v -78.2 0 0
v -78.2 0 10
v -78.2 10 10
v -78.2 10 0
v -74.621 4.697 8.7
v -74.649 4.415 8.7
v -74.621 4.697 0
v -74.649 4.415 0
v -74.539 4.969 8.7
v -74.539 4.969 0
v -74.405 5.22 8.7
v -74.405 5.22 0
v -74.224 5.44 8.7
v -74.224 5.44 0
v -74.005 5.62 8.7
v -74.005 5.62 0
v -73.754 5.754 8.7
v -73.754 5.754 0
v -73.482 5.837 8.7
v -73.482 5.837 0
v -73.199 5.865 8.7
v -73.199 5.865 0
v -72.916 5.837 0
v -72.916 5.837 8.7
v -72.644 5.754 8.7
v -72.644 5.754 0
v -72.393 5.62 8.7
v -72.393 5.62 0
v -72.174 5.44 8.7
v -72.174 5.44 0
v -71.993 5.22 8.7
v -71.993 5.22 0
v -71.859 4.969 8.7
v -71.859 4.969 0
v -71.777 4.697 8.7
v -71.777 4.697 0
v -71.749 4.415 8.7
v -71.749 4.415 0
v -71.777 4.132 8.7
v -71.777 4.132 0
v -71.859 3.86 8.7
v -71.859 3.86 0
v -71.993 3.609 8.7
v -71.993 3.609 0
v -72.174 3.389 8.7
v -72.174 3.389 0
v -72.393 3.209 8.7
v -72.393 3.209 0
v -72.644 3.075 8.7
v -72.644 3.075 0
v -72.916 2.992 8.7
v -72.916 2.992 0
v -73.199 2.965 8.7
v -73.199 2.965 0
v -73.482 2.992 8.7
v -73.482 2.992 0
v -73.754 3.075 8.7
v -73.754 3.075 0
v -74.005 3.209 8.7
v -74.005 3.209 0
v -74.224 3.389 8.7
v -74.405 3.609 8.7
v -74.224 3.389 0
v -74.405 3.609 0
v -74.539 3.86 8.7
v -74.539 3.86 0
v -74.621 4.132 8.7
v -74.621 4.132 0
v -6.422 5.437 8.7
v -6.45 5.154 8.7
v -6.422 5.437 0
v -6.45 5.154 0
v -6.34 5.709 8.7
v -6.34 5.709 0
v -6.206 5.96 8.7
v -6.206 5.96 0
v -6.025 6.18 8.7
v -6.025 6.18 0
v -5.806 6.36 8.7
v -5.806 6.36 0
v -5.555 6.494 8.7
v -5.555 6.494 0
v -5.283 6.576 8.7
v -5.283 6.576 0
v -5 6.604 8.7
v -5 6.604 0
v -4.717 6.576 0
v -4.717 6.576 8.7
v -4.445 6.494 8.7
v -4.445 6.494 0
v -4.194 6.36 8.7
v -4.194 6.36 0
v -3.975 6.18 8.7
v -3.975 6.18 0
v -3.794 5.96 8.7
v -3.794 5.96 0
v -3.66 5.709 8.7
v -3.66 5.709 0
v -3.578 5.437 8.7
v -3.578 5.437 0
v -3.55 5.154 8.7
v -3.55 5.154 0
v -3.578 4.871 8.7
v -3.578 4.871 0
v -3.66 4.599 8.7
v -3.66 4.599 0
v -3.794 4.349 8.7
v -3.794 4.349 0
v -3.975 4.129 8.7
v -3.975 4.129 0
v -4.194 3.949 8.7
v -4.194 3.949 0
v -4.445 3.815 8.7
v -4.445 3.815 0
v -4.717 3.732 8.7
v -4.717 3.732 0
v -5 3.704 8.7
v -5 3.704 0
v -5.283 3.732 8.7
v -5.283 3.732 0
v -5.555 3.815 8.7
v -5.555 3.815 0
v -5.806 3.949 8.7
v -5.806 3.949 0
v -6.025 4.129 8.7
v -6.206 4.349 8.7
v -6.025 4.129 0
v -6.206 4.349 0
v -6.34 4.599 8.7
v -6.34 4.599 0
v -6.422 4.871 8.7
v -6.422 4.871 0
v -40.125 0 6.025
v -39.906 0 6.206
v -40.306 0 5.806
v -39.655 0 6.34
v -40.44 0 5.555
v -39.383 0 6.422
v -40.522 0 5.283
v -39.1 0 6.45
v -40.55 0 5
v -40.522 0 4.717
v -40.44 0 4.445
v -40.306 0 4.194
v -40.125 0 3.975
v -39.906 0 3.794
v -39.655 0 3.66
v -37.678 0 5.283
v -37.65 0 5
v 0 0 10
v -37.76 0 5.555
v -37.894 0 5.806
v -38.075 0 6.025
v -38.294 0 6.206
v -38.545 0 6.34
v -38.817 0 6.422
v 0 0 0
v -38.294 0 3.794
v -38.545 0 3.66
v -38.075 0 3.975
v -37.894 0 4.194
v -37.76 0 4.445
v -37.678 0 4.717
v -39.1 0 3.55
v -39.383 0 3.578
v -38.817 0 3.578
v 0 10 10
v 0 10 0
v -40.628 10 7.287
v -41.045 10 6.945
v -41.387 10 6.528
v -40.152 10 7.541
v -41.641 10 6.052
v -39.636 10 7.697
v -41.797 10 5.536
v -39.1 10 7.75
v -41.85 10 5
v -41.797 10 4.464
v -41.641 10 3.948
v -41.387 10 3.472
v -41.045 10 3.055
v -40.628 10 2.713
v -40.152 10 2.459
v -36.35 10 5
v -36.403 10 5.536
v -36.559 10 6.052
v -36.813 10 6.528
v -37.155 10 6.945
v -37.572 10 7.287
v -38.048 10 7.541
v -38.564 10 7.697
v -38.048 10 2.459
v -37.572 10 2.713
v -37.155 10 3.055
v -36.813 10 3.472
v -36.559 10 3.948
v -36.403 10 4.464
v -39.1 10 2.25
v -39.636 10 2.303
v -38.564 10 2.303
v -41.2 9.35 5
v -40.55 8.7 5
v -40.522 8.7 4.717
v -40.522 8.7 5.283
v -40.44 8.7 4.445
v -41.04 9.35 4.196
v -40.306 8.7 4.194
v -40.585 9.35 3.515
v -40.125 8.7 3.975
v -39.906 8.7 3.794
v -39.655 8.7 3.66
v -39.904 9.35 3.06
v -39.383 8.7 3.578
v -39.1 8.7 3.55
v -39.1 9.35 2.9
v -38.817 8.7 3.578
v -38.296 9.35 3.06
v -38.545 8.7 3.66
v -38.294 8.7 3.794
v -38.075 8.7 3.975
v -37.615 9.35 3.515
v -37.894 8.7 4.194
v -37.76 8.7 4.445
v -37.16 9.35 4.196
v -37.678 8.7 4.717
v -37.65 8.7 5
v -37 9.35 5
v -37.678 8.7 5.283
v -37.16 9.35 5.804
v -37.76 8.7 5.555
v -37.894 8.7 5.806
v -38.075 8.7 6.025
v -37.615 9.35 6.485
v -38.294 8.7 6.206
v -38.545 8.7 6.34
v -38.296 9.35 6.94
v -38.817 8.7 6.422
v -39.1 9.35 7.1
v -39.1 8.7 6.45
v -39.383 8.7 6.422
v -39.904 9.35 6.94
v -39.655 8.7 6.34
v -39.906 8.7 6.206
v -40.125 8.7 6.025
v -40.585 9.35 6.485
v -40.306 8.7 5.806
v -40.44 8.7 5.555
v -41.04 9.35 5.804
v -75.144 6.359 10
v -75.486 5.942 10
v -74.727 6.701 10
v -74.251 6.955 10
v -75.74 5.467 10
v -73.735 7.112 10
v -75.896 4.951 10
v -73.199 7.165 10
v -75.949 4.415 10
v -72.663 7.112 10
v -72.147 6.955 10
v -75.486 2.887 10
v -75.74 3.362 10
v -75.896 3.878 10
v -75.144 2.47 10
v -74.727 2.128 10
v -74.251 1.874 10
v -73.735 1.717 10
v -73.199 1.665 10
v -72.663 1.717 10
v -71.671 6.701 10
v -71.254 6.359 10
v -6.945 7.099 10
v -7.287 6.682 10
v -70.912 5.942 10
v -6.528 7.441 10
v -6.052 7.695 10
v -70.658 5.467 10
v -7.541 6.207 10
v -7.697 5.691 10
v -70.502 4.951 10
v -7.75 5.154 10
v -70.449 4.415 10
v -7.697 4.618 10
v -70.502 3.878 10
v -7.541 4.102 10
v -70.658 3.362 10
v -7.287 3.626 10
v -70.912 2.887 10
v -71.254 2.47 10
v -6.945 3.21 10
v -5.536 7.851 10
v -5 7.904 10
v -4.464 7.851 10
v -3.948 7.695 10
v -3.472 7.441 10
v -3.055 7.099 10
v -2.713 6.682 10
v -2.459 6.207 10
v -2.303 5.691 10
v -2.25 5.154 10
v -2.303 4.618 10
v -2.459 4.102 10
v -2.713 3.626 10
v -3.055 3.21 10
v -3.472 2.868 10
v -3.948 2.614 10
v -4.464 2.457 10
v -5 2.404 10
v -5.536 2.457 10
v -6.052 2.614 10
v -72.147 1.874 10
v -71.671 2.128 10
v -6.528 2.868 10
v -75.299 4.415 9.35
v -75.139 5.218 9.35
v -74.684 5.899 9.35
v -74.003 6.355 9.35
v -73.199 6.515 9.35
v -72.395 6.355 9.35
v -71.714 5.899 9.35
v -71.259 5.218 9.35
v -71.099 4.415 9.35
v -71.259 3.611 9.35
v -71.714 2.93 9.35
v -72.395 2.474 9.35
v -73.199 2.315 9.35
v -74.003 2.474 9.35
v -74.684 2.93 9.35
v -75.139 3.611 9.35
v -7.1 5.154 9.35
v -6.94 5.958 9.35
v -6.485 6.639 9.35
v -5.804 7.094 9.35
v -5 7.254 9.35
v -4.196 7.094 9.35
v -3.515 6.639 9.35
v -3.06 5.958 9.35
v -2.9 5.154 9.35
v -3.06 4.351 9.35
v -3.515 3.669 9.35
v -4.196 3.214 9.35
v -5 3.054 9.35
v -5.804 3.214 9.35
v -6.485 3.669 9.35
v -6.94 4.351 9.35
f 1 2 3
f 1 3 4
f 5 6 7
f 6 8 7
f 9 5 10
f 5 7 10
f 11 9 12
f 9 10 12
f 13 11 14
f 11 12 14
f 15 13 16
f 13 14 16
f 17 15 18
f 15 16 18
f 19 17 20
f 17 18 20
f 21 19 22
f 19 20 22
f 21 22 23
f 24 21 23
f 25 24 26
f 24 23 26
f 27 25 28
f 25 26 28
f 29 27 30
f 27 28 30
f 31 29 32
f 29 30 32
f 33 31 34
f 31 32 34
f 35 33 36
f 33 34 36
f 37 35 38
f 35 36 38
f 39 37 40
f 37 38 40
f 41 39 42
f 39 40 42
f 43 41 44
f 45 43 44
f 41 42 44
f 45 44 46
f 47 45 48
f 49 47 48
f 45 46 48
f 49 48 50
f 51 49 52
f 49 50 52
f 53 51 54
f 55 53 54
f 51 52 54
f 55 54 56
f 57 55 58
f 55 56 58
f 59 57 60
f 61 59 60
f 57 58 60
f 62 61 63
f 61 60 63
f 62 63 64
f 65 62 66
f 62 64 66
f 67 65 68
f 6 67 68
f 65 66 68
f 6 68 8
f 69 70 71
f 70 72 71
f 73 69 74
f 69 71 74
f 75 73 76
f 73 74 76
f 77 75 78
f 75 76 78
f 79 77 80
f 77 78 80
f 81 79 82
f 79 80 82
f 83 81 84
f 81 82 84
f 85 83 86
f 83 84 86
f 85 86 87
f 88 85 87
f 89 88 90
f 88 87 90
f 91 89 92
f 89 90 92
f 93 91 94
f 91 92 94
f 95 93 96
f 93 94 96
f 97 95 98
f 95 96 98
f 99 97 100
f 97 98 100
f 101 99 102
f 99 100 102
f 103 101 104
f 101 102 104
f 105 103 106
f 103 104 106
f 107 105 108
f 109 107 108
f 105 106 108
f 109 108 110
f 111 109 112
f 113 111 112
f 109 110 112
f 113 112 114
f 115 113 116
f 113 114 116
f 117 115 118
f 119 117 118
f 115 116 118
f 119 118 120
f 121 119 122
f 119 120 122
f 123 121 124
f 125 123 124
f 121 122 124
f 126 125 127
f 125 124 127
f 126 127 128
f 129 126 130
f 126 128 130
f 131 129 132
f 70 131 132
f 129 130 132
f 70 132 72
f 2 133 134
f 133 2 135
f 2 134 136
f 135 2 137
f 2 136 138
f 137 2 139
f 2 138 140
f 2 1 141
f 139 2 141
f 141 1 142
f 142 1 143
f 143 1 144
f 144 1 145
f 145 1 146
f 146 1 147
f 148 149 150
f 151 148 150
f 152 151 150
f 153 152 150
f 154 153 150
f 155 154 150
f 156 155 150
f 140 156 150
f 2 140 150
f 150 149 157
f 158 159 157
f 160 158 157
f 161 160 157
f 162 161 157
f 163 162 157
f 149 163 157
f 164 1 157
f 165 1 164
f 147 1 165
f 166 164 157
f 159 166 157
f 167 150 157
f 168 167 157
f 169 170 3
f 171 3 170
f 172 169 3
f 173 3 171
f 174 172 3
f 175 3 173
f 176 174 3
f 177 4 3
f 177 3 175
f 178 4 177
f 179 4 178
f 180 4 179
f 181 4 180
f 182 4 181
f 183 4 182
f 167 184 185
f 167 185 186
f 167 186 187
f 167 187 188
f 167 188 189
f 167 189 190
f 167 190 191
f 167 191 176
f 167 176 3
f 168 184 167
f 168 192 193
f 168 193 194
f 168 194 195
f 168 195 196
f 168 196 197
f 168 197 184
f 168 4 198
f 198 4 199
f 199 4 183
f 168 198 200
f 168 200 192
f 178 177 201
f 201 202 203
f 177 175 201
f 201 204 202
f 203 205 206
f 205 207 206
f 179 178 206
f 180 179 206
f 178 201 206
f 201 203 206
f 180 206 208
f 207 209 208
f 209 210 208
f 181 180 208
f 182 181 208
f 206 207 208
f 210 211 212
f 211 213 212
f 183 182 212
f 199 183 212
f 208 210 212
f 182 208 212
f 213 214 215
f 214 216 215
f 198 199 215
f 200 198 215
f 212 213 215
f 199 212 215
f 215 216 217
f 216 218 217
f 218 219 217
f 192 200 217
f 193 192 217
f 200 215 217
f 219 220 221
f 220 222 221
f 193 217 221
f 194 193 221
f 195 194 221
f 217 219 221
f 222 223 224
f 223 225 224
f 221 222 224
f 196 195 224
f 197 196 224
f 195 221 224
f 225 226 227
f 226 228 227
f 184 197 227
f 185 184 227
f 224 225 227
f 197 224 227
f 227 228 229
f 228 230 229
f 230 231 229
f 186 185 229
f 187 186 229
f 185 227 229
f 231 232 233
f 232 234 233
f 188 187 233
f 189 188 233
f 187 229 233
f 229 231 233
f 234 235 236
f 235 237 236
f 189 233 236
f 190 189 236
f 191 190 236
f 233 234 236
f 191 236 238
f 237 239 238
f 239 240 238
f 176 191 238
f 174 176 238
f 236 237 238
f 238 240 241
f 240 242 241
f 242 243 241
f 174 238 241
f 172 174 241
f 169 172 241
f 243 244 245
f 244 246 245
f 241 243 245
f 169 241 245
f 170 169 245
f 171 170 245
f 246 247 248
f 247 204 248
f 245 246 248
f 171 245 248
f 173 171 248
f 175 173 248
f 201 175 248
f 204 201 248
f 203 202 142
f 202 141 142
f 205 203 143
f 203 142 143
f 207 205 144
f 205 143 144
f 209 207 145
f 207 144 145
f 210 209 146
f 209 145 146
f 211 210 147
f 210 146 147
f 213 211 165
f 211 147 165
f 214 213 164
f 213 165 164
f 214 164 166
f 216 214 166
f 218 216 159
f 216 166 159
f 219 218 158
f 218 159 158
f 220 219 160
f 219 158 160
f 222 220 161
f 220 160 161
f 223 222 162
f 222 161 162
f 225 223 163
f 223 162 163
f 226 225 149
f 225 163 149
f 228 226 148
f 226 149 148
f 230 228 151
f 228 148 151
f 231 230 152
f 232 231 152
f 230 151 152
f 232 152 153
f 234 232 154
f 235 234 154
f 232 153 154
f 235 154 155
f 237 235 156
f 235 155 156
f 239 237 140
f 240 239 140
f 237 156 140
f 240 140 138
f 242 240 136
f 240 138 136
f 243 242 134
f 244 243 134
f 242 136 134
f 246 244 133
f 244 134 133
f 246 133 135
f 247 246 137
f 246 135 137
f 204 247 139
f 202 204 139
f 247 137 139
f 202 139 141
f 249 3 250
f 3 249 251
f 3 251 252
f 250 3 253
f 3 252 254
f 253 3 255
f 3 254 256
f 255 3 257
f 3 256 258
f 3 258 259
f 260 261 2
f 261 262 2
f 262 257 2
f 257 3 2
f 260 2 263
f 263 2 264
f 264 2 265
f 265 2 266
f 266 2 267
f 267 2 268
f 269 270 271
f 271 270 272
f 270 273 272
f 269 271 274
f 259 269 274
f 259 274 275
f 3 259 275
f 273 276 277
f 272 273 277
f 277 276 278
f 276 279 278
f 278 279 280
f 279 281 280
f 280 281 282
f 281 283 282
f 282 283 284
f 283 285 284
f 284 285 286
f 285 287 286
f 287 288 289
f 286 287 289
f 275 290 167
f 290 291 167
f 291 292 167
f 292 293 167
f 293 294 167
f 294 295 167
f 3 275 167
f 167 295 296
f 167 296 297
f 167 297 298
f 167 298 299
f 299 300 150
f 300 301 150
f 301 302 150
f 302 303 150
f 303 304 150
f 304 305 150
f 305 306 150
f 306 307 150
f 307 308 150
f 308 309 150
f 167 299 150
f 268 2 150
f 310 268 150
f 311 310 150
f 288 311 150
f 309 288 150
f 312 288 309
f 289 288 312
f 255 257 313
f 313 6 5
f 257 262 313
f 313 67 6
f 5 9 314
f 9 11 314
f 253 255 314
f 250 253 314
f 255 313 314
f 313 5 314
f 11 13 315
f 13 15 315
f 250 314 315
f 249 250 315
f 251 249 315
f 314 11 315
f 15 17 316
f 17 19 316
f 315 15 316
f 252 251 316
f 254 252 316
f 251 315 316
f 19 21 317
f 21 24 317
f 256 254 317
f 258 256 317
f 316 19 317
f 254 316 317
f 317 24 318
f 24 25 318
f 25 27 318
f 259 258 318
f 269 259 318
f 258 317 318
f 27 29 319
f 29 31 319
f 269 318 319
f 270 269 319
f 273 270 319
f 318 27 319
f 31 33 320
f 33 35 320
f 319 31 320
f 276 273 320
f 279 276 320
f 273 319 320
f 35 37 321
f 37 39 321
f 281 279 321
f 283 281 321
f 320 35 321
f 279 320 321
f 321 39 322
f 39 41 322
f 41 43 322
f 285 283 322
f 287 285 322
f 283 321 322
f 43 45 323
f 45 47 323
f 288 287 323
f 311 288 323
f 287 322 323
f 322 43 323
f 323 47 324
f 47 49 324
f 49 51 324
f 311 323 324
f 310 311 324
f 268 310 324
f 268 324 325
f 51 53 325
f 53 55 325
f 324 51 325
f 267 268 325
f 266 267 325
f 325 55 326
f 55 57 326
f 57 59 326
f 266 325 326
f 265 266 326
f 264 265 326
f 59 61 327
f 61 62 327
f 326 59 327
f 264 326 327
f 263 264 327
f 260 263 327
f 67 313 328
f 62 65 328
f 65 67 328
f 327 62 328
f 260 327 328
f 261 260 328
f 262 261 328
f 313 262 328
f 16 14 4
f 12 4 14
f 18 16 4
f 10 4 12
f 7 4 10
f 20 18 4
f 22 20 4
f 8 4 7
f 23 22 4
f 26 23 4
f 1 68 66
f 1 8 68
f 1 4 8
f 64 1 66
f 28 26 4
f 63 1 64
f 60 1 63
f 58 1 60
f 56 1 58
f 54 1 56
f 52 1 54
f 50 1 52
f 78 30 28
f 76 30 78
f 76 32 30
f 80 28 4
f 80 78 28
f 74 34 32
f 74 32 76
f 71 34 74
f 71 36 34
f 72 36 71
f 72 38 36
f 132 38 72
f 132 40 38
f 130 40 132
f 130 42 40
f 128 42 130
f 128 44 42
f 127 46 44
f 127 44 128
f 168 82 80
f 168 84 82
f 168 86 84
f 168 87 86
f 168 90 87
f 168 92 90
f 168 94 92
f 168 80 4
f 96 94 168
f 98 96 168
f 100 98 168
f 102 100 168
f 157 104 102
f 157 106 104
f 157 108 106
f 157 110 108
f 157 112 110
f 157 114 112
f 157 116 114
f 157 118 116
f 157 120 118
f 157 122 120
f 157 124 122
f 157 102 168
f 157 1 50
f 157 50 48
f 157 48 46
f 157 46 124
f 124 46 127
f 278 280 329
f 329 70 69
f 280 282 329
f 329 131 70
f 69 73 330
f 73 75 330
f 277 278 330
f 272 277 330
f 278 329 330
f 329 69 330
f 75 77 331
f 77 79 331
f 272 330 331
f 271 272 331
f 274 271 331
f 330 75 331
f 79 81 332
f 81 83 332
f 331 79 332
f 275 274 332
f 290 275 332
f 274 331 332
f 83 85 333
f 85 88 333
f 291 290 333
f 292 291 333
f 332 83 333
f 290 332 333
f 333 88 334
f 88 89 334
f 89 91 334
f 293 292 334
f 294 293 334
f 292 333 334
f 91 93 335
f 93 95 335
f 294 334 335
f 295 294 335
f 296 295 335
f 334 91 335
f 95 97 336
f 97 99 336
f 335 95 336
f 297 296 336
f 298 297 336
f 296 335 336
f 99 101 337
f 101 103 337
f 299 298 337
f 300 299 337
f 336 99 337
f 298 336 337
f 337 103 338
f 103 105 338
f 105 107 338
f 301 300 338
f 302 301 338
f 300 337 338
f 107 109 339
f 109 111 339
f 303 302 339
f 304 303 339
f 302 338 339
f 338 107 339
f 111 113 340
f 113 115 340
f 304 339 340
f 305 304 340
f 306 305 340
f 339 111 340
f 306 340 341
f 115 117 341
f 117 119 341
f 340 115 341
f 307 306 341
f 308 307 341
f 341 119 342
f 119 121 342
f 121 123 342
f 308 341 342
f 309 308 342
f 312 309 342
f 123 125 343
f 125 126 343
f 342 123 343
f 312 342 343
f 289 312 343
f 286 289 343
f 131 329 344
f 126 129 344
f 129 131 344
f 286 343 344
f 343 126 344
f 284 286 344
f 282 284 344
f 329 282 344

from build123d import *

# Parameters (mm, degrees)
SKETCH1_W                                         = 78.2
SKETCH1_H                                         = 10
BOSS_EXTRUDE1_DEPTH                               = 10
CSK_FOR_M2_5_FLAT_HEAD_MACHINE_SCREW1_D           = 2.9
CSK_FOR_M2_5_FLAT_HEAD_MACHINE_SCREW1_CSINK_D     = 5.5
CSK_FOR_M2_5_FLAT_HEAD_MACHINE_SCREW1_CSINK_ANGLE = 90
CSK_FOR_M2_5_FLAT_HEAD_MACHINE_SCREW2_D           = 2.9
CSK_FOR_M2_5_FLAT_HEAD_MACHINE_SCREW2_CSINK_D     = 5.5
CSK_FOR_M2_5_FLAT_HEAD_MACHINE_SCREW2_CSINK_ANGLE = 90
CSK_FOR_M2_5_FLAT_HEAD_MACHINE_SCREW3_D           = 2.9
CSK_FOR_M2_5_FLAT_HEAD_MACHINE_SCREW3_CSINK_D     = 5.5
CSK_FOR_M2_5_FLAT_HEAD_MACHINE_SCREW3_CSINK_ANGLE = 90


with BuildPart() as part:
    # Sketch1 → Boss-Extrude1 (new body)
    with BuildSketch(Plane(origin=(0, 0, 0), x_dir=(1, 0, 0), z_dir=(0, 1, 0))):
        with Locations((-39.1, -5)):
            Rectangle(SKETCH1_W, SKETCH1_H)
    extrude(amount=BOSS_EXTRUDE1_DEPTH)

    # CSK for M2.5 Flat Head Machine Screw1 (through all)
    with Locations(Plane.XY.offset(10)):
        with Locations((-5, 5.154214905)):
            CounterSinkHole(CSK_FOR_M2_5_FLAT_HEAD_MACHINE_SCREW1_D / 2, CSK_FOR_M2_5_FLAT_HEAD_MACHINE_SCREW1_CSINK_D / 2, counter_sink_angle=CSK_FOR_M2_5_FLAT_HEAD_MACHINE_SCREW1_CSINK_ANGLE)

    # CSK for M2.5 Flat Head Machine Screw2 (through all)
    with Locations(Plane.XY.offset(10)):
        with Locations((-73.199, 4.414547578)):
            CounterSinkHole(CSK_FOR_M2_5_FLAT_HEAD_MACHINE_SCREW2_D / 2, CSK_FOR_M2_5_FLAT_HEAD_MACHINE_SCREW2_CSINK_D / 2, counter_sink_angle=CSK_FOR_M2_5_FLAT_HEAD_MACHINE_SCREW2_CSINK_ANGLE)

    # CSK for M2.5 Flat Head Machine Screw3 (through all)
    with Locations(Plane(origin=(0, 10, 0), x_dir=(1, 0, 0), z_dir=(0, 1, 0))):
        with Locations((-39.1, -5)):
            CounterSinkHole(CSK_FOR_M2_5_FLAT_HEAD_MACHINE_SCREW3_D / 2, CSK_FOR_M2_5_FLAT_HEAD_MACHINE_SCREW3_CSINK_D / 2, counter_sink_angle=CSK_FOR_M2_5_FLAT_HEAD_MACHINE_SCREW3_CSINK_ANGLE)


solid = part.part
